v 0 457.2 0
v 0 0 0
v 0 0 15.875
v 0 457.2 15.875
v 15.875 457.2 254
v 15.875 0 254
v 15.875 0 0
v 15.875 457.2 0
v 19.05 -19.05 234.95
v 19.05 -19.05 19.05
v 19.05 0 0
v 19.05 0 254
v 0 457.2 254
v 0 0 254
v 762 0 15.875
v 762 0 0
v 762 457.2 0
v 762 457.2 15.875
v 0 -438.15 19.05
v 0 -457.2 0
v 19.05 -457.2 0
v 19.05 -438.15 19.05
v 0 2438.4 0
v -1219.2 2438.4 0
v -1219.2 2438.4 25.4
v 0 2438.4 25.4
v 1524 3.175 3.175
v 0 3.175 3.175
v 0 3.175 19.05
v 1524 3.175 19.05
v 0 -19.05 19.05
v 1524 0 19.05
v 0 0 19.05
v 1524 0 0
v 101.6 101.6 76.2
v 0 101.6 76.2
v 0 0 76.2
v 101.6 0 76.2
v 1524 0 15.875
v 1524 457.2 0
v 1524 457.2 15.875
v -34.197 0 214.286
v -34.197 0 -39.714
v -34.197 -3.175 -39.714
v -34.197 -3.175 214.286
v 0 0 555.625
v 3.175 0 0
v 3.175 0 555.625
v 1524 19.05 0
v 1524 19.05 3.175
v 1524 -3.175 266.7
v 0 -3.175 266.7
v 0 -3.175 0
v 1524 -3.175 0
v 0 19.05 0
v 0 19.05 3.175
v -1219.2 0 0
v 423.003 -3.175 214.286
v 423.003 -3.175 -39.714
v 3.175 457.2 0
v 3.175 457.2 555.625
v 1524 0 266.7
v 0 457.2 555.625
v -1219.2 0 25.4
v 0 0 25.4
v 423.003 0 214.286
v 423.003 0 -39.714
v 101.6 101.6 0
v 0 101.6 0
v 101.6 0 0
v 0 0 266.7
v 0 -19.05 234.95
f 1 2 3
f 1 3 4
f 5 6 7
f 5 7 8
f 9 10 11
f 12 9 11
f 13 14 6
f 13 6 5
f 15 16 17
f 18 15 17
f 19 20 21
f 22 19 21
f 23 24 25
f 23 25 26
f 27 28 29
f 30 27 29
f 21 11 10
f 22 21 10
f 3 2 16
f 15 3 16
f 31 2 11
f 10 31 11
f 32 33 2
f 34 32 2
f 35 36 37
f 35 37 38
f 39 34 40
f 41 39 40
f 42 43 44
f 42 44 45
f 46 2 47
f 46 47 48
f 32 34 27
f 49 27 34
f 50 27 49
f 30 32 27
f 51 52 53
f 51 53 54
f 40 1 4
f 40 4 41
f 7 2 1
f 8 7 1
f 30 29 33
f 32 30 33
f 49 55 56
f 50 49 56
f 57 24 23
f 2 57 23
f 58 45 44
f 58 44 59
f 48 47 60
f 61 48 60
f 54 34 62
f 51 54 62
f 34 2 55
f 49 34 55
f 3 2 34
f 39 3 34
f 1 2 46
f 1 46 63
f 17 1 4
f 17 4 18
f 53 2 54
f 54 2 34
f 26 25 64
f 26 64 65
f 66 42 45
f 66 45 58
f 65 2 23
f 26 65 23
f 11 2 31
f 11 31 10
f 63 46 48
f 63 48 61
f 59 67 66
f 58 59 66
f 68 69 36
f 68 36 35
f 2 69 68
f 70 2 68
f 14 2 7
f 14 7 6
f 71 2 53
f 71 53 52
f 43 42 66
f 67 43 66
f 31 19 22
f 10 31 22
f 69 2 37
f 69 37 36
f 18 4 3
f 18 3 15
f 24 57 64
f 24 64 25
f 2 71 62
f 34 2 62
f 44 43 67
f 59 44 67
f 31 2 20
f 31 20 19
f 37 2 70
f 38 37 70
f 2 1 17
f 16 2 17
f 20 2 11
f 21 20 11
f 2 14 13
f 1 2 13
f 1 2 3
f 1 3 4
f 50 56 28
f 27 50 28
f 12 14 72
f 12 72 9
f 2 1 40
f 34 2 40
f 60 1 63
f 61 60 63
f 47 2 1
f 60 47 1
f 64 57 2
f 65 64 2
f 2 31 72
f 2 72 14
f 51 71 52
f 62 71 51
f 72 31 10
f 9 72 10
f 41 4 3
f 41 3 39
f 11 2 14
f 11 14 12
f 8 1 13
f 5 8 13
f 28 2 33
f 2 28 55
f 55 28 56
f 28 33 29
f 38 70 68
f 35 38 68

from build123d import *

# Parameters (mm, degrees)
F0_W      = 1524
F0_H      = 457.2
F1_DEPTH  = 15.875
F2_W      = 457.2
F2_H      = 254
F3_DEPTH  = 15.875
F4_W      = 101.6
F4_H      = 101.6
F5_DEPTH  = 76.2
F7_DEPTH  = 1524
F8_W      = 19.05
F8_H      = 19.05
F9_DEPTH  = 457.2
F10_SIZE  = 19.04999
F11_W     = 19.05
F11_H     = 19.05
F12_DEPTH = 254
F13_SIZE  = 19.04999
F14_W     = 457.2
F14_H     = 254
F15_DEPTH = 3.175
F16_W     = 457.2
F16_H     = 555.625
F17_DEPTH = 3.175
F18_W     = 1524
F18_H     = 266.7
F19_DEPTH = 3.175
F21_W     = 762
F21_H     = 457.2
F22_DEPTH = 15.875
F20_W     = 1219.2
F20_H     = 2438.4
F23_DEPTH = 25.4


# Not quite as in the source:
# - a fillet or chamfer is up to 0.001 mm smaller than in the source, because OpenCascade refuses the exact size


with BuildPart() as f1:
    # F0 (on Top) → F1 (new body)
    with BuildSketch(Plane.XY):
        with Locations((762, 228.6)):
            Rectangle(F0_W, F0_H)
    extrude(amount=F1_DEPTH)


with BuildPart() as f3:
    # F2 (on Right) → F3 (new body)
    with BuildSketch(Plane.YZ):
        with Locations((228.6, 127)):
            Rectangle(F2_W, F2_H)
    extrude(amount=F3_DEPTH)


with BuildPart() as f5:
    # F4 (on Top) → F5 (new body)
    with BuildSketch(Plane.XY):
        with Locations((50.8, 50.8)):
            Rectangle(F4_W, F4_H)
    extrude(amount=F5_DEPTH)


with BuildPart() as f7:
    # F6 (on Right) → F7 (new body)
    with BuildSketch(Plane.YZ):
        Polygon((0, 19.05), (0, 0), (19.05, 0), (19.05, 3.175), (3.175, 3.175), (3.175, 19.05), align=None)
    extrude(amount=F7_DEPTH)


with BuildPart() as f9:
    # F8 (on Front) → F9 (new body)
    with BuildSketch(Plane.XZ):
        with Locations((9.525, 9.525)):
            Rectangle(F8_W, F8_H)
    extrude(amount=F9_DEPTH)

    # F10 (size 19.05 in the source; OpenCascade refuses exactly that, so slightly less here)
    f10_edges = [f9.edges().sort_by_distance(p)[0] for p in [
        (9.525, -457.2, 19.05),
        (9.525, 0, 19.05),
    ]]
    chamfer(f10_edges, length=F10_SIZE)


with BuildPart() as f12:
    # F11 (on Top) → F12 (new body)
    with BuildSketch(Plane.XY):
        with Locations((9.525, -9.525)):
            Rectangle(F11_W, F11_H)
    extrude(amount=F12_DEPTH)

    # F13 (size 19.05 in the source; OpenCascade refuses exactly that, so slightly less here)
    f13_edges = [f12.edges().sort_by_distance(p)[0] for p in [
        (9.525, -19.05, 254),
        (9.525, -19.05, 0),
    ]]
    chamfer(f13_edges, length=F13_SIZE)


with BuildPart() as f15:
    # F14 (on Front) → F15 (new body)
    with BuildSketch(Plane.XZ):
        with Locations((194.4030308783, 87.2860808372)):
            Rectangle(F14_W, F14_H)
    extrude(amount=F15_DEPTH)


with BuildPart() as f17:
    # F16 (on Right) → F17 (new body)
    with BuildSketch(Plane.YZ):
        with Locations((228.6, 277.8125)):
            Rectangle(F16_W, F16_H)
    extrude(amount=F17_DEPTH)


with BuildPart() as f19:
    # F18 (on Front) → F19 (new body)
    with BuildSketch(Plane.XZ):
        with Locations((762, 133.35)):
            Rectangle(F18_W, F18_H)
    extrude(amount=F19_DEPTH)


with BuildPart() as f22:
    # F21 (on Top) → F22 (new body)
    with BuildSketch(Plane.XY):
        with Locations((381, 228.6)):
            Rectangle(F21_W, F21_H)
    extrude(amount=F22_DEPTH)


with BuildPart() as f23:
    # F20 (on Top) → F23 (new body)
    with BuildSketch(Plane.XY):
        with Locations((-609.6, 1219.2)):
            Rectangle(F20_W, F20_H)
    extrude(amount=F23_DEPTH)


solid = Compound([f1.part, f3.part, f5.part, f7.part, f9.part, f12.part, f15.part, f17.part, f19.part, f22.part, f23.part])
